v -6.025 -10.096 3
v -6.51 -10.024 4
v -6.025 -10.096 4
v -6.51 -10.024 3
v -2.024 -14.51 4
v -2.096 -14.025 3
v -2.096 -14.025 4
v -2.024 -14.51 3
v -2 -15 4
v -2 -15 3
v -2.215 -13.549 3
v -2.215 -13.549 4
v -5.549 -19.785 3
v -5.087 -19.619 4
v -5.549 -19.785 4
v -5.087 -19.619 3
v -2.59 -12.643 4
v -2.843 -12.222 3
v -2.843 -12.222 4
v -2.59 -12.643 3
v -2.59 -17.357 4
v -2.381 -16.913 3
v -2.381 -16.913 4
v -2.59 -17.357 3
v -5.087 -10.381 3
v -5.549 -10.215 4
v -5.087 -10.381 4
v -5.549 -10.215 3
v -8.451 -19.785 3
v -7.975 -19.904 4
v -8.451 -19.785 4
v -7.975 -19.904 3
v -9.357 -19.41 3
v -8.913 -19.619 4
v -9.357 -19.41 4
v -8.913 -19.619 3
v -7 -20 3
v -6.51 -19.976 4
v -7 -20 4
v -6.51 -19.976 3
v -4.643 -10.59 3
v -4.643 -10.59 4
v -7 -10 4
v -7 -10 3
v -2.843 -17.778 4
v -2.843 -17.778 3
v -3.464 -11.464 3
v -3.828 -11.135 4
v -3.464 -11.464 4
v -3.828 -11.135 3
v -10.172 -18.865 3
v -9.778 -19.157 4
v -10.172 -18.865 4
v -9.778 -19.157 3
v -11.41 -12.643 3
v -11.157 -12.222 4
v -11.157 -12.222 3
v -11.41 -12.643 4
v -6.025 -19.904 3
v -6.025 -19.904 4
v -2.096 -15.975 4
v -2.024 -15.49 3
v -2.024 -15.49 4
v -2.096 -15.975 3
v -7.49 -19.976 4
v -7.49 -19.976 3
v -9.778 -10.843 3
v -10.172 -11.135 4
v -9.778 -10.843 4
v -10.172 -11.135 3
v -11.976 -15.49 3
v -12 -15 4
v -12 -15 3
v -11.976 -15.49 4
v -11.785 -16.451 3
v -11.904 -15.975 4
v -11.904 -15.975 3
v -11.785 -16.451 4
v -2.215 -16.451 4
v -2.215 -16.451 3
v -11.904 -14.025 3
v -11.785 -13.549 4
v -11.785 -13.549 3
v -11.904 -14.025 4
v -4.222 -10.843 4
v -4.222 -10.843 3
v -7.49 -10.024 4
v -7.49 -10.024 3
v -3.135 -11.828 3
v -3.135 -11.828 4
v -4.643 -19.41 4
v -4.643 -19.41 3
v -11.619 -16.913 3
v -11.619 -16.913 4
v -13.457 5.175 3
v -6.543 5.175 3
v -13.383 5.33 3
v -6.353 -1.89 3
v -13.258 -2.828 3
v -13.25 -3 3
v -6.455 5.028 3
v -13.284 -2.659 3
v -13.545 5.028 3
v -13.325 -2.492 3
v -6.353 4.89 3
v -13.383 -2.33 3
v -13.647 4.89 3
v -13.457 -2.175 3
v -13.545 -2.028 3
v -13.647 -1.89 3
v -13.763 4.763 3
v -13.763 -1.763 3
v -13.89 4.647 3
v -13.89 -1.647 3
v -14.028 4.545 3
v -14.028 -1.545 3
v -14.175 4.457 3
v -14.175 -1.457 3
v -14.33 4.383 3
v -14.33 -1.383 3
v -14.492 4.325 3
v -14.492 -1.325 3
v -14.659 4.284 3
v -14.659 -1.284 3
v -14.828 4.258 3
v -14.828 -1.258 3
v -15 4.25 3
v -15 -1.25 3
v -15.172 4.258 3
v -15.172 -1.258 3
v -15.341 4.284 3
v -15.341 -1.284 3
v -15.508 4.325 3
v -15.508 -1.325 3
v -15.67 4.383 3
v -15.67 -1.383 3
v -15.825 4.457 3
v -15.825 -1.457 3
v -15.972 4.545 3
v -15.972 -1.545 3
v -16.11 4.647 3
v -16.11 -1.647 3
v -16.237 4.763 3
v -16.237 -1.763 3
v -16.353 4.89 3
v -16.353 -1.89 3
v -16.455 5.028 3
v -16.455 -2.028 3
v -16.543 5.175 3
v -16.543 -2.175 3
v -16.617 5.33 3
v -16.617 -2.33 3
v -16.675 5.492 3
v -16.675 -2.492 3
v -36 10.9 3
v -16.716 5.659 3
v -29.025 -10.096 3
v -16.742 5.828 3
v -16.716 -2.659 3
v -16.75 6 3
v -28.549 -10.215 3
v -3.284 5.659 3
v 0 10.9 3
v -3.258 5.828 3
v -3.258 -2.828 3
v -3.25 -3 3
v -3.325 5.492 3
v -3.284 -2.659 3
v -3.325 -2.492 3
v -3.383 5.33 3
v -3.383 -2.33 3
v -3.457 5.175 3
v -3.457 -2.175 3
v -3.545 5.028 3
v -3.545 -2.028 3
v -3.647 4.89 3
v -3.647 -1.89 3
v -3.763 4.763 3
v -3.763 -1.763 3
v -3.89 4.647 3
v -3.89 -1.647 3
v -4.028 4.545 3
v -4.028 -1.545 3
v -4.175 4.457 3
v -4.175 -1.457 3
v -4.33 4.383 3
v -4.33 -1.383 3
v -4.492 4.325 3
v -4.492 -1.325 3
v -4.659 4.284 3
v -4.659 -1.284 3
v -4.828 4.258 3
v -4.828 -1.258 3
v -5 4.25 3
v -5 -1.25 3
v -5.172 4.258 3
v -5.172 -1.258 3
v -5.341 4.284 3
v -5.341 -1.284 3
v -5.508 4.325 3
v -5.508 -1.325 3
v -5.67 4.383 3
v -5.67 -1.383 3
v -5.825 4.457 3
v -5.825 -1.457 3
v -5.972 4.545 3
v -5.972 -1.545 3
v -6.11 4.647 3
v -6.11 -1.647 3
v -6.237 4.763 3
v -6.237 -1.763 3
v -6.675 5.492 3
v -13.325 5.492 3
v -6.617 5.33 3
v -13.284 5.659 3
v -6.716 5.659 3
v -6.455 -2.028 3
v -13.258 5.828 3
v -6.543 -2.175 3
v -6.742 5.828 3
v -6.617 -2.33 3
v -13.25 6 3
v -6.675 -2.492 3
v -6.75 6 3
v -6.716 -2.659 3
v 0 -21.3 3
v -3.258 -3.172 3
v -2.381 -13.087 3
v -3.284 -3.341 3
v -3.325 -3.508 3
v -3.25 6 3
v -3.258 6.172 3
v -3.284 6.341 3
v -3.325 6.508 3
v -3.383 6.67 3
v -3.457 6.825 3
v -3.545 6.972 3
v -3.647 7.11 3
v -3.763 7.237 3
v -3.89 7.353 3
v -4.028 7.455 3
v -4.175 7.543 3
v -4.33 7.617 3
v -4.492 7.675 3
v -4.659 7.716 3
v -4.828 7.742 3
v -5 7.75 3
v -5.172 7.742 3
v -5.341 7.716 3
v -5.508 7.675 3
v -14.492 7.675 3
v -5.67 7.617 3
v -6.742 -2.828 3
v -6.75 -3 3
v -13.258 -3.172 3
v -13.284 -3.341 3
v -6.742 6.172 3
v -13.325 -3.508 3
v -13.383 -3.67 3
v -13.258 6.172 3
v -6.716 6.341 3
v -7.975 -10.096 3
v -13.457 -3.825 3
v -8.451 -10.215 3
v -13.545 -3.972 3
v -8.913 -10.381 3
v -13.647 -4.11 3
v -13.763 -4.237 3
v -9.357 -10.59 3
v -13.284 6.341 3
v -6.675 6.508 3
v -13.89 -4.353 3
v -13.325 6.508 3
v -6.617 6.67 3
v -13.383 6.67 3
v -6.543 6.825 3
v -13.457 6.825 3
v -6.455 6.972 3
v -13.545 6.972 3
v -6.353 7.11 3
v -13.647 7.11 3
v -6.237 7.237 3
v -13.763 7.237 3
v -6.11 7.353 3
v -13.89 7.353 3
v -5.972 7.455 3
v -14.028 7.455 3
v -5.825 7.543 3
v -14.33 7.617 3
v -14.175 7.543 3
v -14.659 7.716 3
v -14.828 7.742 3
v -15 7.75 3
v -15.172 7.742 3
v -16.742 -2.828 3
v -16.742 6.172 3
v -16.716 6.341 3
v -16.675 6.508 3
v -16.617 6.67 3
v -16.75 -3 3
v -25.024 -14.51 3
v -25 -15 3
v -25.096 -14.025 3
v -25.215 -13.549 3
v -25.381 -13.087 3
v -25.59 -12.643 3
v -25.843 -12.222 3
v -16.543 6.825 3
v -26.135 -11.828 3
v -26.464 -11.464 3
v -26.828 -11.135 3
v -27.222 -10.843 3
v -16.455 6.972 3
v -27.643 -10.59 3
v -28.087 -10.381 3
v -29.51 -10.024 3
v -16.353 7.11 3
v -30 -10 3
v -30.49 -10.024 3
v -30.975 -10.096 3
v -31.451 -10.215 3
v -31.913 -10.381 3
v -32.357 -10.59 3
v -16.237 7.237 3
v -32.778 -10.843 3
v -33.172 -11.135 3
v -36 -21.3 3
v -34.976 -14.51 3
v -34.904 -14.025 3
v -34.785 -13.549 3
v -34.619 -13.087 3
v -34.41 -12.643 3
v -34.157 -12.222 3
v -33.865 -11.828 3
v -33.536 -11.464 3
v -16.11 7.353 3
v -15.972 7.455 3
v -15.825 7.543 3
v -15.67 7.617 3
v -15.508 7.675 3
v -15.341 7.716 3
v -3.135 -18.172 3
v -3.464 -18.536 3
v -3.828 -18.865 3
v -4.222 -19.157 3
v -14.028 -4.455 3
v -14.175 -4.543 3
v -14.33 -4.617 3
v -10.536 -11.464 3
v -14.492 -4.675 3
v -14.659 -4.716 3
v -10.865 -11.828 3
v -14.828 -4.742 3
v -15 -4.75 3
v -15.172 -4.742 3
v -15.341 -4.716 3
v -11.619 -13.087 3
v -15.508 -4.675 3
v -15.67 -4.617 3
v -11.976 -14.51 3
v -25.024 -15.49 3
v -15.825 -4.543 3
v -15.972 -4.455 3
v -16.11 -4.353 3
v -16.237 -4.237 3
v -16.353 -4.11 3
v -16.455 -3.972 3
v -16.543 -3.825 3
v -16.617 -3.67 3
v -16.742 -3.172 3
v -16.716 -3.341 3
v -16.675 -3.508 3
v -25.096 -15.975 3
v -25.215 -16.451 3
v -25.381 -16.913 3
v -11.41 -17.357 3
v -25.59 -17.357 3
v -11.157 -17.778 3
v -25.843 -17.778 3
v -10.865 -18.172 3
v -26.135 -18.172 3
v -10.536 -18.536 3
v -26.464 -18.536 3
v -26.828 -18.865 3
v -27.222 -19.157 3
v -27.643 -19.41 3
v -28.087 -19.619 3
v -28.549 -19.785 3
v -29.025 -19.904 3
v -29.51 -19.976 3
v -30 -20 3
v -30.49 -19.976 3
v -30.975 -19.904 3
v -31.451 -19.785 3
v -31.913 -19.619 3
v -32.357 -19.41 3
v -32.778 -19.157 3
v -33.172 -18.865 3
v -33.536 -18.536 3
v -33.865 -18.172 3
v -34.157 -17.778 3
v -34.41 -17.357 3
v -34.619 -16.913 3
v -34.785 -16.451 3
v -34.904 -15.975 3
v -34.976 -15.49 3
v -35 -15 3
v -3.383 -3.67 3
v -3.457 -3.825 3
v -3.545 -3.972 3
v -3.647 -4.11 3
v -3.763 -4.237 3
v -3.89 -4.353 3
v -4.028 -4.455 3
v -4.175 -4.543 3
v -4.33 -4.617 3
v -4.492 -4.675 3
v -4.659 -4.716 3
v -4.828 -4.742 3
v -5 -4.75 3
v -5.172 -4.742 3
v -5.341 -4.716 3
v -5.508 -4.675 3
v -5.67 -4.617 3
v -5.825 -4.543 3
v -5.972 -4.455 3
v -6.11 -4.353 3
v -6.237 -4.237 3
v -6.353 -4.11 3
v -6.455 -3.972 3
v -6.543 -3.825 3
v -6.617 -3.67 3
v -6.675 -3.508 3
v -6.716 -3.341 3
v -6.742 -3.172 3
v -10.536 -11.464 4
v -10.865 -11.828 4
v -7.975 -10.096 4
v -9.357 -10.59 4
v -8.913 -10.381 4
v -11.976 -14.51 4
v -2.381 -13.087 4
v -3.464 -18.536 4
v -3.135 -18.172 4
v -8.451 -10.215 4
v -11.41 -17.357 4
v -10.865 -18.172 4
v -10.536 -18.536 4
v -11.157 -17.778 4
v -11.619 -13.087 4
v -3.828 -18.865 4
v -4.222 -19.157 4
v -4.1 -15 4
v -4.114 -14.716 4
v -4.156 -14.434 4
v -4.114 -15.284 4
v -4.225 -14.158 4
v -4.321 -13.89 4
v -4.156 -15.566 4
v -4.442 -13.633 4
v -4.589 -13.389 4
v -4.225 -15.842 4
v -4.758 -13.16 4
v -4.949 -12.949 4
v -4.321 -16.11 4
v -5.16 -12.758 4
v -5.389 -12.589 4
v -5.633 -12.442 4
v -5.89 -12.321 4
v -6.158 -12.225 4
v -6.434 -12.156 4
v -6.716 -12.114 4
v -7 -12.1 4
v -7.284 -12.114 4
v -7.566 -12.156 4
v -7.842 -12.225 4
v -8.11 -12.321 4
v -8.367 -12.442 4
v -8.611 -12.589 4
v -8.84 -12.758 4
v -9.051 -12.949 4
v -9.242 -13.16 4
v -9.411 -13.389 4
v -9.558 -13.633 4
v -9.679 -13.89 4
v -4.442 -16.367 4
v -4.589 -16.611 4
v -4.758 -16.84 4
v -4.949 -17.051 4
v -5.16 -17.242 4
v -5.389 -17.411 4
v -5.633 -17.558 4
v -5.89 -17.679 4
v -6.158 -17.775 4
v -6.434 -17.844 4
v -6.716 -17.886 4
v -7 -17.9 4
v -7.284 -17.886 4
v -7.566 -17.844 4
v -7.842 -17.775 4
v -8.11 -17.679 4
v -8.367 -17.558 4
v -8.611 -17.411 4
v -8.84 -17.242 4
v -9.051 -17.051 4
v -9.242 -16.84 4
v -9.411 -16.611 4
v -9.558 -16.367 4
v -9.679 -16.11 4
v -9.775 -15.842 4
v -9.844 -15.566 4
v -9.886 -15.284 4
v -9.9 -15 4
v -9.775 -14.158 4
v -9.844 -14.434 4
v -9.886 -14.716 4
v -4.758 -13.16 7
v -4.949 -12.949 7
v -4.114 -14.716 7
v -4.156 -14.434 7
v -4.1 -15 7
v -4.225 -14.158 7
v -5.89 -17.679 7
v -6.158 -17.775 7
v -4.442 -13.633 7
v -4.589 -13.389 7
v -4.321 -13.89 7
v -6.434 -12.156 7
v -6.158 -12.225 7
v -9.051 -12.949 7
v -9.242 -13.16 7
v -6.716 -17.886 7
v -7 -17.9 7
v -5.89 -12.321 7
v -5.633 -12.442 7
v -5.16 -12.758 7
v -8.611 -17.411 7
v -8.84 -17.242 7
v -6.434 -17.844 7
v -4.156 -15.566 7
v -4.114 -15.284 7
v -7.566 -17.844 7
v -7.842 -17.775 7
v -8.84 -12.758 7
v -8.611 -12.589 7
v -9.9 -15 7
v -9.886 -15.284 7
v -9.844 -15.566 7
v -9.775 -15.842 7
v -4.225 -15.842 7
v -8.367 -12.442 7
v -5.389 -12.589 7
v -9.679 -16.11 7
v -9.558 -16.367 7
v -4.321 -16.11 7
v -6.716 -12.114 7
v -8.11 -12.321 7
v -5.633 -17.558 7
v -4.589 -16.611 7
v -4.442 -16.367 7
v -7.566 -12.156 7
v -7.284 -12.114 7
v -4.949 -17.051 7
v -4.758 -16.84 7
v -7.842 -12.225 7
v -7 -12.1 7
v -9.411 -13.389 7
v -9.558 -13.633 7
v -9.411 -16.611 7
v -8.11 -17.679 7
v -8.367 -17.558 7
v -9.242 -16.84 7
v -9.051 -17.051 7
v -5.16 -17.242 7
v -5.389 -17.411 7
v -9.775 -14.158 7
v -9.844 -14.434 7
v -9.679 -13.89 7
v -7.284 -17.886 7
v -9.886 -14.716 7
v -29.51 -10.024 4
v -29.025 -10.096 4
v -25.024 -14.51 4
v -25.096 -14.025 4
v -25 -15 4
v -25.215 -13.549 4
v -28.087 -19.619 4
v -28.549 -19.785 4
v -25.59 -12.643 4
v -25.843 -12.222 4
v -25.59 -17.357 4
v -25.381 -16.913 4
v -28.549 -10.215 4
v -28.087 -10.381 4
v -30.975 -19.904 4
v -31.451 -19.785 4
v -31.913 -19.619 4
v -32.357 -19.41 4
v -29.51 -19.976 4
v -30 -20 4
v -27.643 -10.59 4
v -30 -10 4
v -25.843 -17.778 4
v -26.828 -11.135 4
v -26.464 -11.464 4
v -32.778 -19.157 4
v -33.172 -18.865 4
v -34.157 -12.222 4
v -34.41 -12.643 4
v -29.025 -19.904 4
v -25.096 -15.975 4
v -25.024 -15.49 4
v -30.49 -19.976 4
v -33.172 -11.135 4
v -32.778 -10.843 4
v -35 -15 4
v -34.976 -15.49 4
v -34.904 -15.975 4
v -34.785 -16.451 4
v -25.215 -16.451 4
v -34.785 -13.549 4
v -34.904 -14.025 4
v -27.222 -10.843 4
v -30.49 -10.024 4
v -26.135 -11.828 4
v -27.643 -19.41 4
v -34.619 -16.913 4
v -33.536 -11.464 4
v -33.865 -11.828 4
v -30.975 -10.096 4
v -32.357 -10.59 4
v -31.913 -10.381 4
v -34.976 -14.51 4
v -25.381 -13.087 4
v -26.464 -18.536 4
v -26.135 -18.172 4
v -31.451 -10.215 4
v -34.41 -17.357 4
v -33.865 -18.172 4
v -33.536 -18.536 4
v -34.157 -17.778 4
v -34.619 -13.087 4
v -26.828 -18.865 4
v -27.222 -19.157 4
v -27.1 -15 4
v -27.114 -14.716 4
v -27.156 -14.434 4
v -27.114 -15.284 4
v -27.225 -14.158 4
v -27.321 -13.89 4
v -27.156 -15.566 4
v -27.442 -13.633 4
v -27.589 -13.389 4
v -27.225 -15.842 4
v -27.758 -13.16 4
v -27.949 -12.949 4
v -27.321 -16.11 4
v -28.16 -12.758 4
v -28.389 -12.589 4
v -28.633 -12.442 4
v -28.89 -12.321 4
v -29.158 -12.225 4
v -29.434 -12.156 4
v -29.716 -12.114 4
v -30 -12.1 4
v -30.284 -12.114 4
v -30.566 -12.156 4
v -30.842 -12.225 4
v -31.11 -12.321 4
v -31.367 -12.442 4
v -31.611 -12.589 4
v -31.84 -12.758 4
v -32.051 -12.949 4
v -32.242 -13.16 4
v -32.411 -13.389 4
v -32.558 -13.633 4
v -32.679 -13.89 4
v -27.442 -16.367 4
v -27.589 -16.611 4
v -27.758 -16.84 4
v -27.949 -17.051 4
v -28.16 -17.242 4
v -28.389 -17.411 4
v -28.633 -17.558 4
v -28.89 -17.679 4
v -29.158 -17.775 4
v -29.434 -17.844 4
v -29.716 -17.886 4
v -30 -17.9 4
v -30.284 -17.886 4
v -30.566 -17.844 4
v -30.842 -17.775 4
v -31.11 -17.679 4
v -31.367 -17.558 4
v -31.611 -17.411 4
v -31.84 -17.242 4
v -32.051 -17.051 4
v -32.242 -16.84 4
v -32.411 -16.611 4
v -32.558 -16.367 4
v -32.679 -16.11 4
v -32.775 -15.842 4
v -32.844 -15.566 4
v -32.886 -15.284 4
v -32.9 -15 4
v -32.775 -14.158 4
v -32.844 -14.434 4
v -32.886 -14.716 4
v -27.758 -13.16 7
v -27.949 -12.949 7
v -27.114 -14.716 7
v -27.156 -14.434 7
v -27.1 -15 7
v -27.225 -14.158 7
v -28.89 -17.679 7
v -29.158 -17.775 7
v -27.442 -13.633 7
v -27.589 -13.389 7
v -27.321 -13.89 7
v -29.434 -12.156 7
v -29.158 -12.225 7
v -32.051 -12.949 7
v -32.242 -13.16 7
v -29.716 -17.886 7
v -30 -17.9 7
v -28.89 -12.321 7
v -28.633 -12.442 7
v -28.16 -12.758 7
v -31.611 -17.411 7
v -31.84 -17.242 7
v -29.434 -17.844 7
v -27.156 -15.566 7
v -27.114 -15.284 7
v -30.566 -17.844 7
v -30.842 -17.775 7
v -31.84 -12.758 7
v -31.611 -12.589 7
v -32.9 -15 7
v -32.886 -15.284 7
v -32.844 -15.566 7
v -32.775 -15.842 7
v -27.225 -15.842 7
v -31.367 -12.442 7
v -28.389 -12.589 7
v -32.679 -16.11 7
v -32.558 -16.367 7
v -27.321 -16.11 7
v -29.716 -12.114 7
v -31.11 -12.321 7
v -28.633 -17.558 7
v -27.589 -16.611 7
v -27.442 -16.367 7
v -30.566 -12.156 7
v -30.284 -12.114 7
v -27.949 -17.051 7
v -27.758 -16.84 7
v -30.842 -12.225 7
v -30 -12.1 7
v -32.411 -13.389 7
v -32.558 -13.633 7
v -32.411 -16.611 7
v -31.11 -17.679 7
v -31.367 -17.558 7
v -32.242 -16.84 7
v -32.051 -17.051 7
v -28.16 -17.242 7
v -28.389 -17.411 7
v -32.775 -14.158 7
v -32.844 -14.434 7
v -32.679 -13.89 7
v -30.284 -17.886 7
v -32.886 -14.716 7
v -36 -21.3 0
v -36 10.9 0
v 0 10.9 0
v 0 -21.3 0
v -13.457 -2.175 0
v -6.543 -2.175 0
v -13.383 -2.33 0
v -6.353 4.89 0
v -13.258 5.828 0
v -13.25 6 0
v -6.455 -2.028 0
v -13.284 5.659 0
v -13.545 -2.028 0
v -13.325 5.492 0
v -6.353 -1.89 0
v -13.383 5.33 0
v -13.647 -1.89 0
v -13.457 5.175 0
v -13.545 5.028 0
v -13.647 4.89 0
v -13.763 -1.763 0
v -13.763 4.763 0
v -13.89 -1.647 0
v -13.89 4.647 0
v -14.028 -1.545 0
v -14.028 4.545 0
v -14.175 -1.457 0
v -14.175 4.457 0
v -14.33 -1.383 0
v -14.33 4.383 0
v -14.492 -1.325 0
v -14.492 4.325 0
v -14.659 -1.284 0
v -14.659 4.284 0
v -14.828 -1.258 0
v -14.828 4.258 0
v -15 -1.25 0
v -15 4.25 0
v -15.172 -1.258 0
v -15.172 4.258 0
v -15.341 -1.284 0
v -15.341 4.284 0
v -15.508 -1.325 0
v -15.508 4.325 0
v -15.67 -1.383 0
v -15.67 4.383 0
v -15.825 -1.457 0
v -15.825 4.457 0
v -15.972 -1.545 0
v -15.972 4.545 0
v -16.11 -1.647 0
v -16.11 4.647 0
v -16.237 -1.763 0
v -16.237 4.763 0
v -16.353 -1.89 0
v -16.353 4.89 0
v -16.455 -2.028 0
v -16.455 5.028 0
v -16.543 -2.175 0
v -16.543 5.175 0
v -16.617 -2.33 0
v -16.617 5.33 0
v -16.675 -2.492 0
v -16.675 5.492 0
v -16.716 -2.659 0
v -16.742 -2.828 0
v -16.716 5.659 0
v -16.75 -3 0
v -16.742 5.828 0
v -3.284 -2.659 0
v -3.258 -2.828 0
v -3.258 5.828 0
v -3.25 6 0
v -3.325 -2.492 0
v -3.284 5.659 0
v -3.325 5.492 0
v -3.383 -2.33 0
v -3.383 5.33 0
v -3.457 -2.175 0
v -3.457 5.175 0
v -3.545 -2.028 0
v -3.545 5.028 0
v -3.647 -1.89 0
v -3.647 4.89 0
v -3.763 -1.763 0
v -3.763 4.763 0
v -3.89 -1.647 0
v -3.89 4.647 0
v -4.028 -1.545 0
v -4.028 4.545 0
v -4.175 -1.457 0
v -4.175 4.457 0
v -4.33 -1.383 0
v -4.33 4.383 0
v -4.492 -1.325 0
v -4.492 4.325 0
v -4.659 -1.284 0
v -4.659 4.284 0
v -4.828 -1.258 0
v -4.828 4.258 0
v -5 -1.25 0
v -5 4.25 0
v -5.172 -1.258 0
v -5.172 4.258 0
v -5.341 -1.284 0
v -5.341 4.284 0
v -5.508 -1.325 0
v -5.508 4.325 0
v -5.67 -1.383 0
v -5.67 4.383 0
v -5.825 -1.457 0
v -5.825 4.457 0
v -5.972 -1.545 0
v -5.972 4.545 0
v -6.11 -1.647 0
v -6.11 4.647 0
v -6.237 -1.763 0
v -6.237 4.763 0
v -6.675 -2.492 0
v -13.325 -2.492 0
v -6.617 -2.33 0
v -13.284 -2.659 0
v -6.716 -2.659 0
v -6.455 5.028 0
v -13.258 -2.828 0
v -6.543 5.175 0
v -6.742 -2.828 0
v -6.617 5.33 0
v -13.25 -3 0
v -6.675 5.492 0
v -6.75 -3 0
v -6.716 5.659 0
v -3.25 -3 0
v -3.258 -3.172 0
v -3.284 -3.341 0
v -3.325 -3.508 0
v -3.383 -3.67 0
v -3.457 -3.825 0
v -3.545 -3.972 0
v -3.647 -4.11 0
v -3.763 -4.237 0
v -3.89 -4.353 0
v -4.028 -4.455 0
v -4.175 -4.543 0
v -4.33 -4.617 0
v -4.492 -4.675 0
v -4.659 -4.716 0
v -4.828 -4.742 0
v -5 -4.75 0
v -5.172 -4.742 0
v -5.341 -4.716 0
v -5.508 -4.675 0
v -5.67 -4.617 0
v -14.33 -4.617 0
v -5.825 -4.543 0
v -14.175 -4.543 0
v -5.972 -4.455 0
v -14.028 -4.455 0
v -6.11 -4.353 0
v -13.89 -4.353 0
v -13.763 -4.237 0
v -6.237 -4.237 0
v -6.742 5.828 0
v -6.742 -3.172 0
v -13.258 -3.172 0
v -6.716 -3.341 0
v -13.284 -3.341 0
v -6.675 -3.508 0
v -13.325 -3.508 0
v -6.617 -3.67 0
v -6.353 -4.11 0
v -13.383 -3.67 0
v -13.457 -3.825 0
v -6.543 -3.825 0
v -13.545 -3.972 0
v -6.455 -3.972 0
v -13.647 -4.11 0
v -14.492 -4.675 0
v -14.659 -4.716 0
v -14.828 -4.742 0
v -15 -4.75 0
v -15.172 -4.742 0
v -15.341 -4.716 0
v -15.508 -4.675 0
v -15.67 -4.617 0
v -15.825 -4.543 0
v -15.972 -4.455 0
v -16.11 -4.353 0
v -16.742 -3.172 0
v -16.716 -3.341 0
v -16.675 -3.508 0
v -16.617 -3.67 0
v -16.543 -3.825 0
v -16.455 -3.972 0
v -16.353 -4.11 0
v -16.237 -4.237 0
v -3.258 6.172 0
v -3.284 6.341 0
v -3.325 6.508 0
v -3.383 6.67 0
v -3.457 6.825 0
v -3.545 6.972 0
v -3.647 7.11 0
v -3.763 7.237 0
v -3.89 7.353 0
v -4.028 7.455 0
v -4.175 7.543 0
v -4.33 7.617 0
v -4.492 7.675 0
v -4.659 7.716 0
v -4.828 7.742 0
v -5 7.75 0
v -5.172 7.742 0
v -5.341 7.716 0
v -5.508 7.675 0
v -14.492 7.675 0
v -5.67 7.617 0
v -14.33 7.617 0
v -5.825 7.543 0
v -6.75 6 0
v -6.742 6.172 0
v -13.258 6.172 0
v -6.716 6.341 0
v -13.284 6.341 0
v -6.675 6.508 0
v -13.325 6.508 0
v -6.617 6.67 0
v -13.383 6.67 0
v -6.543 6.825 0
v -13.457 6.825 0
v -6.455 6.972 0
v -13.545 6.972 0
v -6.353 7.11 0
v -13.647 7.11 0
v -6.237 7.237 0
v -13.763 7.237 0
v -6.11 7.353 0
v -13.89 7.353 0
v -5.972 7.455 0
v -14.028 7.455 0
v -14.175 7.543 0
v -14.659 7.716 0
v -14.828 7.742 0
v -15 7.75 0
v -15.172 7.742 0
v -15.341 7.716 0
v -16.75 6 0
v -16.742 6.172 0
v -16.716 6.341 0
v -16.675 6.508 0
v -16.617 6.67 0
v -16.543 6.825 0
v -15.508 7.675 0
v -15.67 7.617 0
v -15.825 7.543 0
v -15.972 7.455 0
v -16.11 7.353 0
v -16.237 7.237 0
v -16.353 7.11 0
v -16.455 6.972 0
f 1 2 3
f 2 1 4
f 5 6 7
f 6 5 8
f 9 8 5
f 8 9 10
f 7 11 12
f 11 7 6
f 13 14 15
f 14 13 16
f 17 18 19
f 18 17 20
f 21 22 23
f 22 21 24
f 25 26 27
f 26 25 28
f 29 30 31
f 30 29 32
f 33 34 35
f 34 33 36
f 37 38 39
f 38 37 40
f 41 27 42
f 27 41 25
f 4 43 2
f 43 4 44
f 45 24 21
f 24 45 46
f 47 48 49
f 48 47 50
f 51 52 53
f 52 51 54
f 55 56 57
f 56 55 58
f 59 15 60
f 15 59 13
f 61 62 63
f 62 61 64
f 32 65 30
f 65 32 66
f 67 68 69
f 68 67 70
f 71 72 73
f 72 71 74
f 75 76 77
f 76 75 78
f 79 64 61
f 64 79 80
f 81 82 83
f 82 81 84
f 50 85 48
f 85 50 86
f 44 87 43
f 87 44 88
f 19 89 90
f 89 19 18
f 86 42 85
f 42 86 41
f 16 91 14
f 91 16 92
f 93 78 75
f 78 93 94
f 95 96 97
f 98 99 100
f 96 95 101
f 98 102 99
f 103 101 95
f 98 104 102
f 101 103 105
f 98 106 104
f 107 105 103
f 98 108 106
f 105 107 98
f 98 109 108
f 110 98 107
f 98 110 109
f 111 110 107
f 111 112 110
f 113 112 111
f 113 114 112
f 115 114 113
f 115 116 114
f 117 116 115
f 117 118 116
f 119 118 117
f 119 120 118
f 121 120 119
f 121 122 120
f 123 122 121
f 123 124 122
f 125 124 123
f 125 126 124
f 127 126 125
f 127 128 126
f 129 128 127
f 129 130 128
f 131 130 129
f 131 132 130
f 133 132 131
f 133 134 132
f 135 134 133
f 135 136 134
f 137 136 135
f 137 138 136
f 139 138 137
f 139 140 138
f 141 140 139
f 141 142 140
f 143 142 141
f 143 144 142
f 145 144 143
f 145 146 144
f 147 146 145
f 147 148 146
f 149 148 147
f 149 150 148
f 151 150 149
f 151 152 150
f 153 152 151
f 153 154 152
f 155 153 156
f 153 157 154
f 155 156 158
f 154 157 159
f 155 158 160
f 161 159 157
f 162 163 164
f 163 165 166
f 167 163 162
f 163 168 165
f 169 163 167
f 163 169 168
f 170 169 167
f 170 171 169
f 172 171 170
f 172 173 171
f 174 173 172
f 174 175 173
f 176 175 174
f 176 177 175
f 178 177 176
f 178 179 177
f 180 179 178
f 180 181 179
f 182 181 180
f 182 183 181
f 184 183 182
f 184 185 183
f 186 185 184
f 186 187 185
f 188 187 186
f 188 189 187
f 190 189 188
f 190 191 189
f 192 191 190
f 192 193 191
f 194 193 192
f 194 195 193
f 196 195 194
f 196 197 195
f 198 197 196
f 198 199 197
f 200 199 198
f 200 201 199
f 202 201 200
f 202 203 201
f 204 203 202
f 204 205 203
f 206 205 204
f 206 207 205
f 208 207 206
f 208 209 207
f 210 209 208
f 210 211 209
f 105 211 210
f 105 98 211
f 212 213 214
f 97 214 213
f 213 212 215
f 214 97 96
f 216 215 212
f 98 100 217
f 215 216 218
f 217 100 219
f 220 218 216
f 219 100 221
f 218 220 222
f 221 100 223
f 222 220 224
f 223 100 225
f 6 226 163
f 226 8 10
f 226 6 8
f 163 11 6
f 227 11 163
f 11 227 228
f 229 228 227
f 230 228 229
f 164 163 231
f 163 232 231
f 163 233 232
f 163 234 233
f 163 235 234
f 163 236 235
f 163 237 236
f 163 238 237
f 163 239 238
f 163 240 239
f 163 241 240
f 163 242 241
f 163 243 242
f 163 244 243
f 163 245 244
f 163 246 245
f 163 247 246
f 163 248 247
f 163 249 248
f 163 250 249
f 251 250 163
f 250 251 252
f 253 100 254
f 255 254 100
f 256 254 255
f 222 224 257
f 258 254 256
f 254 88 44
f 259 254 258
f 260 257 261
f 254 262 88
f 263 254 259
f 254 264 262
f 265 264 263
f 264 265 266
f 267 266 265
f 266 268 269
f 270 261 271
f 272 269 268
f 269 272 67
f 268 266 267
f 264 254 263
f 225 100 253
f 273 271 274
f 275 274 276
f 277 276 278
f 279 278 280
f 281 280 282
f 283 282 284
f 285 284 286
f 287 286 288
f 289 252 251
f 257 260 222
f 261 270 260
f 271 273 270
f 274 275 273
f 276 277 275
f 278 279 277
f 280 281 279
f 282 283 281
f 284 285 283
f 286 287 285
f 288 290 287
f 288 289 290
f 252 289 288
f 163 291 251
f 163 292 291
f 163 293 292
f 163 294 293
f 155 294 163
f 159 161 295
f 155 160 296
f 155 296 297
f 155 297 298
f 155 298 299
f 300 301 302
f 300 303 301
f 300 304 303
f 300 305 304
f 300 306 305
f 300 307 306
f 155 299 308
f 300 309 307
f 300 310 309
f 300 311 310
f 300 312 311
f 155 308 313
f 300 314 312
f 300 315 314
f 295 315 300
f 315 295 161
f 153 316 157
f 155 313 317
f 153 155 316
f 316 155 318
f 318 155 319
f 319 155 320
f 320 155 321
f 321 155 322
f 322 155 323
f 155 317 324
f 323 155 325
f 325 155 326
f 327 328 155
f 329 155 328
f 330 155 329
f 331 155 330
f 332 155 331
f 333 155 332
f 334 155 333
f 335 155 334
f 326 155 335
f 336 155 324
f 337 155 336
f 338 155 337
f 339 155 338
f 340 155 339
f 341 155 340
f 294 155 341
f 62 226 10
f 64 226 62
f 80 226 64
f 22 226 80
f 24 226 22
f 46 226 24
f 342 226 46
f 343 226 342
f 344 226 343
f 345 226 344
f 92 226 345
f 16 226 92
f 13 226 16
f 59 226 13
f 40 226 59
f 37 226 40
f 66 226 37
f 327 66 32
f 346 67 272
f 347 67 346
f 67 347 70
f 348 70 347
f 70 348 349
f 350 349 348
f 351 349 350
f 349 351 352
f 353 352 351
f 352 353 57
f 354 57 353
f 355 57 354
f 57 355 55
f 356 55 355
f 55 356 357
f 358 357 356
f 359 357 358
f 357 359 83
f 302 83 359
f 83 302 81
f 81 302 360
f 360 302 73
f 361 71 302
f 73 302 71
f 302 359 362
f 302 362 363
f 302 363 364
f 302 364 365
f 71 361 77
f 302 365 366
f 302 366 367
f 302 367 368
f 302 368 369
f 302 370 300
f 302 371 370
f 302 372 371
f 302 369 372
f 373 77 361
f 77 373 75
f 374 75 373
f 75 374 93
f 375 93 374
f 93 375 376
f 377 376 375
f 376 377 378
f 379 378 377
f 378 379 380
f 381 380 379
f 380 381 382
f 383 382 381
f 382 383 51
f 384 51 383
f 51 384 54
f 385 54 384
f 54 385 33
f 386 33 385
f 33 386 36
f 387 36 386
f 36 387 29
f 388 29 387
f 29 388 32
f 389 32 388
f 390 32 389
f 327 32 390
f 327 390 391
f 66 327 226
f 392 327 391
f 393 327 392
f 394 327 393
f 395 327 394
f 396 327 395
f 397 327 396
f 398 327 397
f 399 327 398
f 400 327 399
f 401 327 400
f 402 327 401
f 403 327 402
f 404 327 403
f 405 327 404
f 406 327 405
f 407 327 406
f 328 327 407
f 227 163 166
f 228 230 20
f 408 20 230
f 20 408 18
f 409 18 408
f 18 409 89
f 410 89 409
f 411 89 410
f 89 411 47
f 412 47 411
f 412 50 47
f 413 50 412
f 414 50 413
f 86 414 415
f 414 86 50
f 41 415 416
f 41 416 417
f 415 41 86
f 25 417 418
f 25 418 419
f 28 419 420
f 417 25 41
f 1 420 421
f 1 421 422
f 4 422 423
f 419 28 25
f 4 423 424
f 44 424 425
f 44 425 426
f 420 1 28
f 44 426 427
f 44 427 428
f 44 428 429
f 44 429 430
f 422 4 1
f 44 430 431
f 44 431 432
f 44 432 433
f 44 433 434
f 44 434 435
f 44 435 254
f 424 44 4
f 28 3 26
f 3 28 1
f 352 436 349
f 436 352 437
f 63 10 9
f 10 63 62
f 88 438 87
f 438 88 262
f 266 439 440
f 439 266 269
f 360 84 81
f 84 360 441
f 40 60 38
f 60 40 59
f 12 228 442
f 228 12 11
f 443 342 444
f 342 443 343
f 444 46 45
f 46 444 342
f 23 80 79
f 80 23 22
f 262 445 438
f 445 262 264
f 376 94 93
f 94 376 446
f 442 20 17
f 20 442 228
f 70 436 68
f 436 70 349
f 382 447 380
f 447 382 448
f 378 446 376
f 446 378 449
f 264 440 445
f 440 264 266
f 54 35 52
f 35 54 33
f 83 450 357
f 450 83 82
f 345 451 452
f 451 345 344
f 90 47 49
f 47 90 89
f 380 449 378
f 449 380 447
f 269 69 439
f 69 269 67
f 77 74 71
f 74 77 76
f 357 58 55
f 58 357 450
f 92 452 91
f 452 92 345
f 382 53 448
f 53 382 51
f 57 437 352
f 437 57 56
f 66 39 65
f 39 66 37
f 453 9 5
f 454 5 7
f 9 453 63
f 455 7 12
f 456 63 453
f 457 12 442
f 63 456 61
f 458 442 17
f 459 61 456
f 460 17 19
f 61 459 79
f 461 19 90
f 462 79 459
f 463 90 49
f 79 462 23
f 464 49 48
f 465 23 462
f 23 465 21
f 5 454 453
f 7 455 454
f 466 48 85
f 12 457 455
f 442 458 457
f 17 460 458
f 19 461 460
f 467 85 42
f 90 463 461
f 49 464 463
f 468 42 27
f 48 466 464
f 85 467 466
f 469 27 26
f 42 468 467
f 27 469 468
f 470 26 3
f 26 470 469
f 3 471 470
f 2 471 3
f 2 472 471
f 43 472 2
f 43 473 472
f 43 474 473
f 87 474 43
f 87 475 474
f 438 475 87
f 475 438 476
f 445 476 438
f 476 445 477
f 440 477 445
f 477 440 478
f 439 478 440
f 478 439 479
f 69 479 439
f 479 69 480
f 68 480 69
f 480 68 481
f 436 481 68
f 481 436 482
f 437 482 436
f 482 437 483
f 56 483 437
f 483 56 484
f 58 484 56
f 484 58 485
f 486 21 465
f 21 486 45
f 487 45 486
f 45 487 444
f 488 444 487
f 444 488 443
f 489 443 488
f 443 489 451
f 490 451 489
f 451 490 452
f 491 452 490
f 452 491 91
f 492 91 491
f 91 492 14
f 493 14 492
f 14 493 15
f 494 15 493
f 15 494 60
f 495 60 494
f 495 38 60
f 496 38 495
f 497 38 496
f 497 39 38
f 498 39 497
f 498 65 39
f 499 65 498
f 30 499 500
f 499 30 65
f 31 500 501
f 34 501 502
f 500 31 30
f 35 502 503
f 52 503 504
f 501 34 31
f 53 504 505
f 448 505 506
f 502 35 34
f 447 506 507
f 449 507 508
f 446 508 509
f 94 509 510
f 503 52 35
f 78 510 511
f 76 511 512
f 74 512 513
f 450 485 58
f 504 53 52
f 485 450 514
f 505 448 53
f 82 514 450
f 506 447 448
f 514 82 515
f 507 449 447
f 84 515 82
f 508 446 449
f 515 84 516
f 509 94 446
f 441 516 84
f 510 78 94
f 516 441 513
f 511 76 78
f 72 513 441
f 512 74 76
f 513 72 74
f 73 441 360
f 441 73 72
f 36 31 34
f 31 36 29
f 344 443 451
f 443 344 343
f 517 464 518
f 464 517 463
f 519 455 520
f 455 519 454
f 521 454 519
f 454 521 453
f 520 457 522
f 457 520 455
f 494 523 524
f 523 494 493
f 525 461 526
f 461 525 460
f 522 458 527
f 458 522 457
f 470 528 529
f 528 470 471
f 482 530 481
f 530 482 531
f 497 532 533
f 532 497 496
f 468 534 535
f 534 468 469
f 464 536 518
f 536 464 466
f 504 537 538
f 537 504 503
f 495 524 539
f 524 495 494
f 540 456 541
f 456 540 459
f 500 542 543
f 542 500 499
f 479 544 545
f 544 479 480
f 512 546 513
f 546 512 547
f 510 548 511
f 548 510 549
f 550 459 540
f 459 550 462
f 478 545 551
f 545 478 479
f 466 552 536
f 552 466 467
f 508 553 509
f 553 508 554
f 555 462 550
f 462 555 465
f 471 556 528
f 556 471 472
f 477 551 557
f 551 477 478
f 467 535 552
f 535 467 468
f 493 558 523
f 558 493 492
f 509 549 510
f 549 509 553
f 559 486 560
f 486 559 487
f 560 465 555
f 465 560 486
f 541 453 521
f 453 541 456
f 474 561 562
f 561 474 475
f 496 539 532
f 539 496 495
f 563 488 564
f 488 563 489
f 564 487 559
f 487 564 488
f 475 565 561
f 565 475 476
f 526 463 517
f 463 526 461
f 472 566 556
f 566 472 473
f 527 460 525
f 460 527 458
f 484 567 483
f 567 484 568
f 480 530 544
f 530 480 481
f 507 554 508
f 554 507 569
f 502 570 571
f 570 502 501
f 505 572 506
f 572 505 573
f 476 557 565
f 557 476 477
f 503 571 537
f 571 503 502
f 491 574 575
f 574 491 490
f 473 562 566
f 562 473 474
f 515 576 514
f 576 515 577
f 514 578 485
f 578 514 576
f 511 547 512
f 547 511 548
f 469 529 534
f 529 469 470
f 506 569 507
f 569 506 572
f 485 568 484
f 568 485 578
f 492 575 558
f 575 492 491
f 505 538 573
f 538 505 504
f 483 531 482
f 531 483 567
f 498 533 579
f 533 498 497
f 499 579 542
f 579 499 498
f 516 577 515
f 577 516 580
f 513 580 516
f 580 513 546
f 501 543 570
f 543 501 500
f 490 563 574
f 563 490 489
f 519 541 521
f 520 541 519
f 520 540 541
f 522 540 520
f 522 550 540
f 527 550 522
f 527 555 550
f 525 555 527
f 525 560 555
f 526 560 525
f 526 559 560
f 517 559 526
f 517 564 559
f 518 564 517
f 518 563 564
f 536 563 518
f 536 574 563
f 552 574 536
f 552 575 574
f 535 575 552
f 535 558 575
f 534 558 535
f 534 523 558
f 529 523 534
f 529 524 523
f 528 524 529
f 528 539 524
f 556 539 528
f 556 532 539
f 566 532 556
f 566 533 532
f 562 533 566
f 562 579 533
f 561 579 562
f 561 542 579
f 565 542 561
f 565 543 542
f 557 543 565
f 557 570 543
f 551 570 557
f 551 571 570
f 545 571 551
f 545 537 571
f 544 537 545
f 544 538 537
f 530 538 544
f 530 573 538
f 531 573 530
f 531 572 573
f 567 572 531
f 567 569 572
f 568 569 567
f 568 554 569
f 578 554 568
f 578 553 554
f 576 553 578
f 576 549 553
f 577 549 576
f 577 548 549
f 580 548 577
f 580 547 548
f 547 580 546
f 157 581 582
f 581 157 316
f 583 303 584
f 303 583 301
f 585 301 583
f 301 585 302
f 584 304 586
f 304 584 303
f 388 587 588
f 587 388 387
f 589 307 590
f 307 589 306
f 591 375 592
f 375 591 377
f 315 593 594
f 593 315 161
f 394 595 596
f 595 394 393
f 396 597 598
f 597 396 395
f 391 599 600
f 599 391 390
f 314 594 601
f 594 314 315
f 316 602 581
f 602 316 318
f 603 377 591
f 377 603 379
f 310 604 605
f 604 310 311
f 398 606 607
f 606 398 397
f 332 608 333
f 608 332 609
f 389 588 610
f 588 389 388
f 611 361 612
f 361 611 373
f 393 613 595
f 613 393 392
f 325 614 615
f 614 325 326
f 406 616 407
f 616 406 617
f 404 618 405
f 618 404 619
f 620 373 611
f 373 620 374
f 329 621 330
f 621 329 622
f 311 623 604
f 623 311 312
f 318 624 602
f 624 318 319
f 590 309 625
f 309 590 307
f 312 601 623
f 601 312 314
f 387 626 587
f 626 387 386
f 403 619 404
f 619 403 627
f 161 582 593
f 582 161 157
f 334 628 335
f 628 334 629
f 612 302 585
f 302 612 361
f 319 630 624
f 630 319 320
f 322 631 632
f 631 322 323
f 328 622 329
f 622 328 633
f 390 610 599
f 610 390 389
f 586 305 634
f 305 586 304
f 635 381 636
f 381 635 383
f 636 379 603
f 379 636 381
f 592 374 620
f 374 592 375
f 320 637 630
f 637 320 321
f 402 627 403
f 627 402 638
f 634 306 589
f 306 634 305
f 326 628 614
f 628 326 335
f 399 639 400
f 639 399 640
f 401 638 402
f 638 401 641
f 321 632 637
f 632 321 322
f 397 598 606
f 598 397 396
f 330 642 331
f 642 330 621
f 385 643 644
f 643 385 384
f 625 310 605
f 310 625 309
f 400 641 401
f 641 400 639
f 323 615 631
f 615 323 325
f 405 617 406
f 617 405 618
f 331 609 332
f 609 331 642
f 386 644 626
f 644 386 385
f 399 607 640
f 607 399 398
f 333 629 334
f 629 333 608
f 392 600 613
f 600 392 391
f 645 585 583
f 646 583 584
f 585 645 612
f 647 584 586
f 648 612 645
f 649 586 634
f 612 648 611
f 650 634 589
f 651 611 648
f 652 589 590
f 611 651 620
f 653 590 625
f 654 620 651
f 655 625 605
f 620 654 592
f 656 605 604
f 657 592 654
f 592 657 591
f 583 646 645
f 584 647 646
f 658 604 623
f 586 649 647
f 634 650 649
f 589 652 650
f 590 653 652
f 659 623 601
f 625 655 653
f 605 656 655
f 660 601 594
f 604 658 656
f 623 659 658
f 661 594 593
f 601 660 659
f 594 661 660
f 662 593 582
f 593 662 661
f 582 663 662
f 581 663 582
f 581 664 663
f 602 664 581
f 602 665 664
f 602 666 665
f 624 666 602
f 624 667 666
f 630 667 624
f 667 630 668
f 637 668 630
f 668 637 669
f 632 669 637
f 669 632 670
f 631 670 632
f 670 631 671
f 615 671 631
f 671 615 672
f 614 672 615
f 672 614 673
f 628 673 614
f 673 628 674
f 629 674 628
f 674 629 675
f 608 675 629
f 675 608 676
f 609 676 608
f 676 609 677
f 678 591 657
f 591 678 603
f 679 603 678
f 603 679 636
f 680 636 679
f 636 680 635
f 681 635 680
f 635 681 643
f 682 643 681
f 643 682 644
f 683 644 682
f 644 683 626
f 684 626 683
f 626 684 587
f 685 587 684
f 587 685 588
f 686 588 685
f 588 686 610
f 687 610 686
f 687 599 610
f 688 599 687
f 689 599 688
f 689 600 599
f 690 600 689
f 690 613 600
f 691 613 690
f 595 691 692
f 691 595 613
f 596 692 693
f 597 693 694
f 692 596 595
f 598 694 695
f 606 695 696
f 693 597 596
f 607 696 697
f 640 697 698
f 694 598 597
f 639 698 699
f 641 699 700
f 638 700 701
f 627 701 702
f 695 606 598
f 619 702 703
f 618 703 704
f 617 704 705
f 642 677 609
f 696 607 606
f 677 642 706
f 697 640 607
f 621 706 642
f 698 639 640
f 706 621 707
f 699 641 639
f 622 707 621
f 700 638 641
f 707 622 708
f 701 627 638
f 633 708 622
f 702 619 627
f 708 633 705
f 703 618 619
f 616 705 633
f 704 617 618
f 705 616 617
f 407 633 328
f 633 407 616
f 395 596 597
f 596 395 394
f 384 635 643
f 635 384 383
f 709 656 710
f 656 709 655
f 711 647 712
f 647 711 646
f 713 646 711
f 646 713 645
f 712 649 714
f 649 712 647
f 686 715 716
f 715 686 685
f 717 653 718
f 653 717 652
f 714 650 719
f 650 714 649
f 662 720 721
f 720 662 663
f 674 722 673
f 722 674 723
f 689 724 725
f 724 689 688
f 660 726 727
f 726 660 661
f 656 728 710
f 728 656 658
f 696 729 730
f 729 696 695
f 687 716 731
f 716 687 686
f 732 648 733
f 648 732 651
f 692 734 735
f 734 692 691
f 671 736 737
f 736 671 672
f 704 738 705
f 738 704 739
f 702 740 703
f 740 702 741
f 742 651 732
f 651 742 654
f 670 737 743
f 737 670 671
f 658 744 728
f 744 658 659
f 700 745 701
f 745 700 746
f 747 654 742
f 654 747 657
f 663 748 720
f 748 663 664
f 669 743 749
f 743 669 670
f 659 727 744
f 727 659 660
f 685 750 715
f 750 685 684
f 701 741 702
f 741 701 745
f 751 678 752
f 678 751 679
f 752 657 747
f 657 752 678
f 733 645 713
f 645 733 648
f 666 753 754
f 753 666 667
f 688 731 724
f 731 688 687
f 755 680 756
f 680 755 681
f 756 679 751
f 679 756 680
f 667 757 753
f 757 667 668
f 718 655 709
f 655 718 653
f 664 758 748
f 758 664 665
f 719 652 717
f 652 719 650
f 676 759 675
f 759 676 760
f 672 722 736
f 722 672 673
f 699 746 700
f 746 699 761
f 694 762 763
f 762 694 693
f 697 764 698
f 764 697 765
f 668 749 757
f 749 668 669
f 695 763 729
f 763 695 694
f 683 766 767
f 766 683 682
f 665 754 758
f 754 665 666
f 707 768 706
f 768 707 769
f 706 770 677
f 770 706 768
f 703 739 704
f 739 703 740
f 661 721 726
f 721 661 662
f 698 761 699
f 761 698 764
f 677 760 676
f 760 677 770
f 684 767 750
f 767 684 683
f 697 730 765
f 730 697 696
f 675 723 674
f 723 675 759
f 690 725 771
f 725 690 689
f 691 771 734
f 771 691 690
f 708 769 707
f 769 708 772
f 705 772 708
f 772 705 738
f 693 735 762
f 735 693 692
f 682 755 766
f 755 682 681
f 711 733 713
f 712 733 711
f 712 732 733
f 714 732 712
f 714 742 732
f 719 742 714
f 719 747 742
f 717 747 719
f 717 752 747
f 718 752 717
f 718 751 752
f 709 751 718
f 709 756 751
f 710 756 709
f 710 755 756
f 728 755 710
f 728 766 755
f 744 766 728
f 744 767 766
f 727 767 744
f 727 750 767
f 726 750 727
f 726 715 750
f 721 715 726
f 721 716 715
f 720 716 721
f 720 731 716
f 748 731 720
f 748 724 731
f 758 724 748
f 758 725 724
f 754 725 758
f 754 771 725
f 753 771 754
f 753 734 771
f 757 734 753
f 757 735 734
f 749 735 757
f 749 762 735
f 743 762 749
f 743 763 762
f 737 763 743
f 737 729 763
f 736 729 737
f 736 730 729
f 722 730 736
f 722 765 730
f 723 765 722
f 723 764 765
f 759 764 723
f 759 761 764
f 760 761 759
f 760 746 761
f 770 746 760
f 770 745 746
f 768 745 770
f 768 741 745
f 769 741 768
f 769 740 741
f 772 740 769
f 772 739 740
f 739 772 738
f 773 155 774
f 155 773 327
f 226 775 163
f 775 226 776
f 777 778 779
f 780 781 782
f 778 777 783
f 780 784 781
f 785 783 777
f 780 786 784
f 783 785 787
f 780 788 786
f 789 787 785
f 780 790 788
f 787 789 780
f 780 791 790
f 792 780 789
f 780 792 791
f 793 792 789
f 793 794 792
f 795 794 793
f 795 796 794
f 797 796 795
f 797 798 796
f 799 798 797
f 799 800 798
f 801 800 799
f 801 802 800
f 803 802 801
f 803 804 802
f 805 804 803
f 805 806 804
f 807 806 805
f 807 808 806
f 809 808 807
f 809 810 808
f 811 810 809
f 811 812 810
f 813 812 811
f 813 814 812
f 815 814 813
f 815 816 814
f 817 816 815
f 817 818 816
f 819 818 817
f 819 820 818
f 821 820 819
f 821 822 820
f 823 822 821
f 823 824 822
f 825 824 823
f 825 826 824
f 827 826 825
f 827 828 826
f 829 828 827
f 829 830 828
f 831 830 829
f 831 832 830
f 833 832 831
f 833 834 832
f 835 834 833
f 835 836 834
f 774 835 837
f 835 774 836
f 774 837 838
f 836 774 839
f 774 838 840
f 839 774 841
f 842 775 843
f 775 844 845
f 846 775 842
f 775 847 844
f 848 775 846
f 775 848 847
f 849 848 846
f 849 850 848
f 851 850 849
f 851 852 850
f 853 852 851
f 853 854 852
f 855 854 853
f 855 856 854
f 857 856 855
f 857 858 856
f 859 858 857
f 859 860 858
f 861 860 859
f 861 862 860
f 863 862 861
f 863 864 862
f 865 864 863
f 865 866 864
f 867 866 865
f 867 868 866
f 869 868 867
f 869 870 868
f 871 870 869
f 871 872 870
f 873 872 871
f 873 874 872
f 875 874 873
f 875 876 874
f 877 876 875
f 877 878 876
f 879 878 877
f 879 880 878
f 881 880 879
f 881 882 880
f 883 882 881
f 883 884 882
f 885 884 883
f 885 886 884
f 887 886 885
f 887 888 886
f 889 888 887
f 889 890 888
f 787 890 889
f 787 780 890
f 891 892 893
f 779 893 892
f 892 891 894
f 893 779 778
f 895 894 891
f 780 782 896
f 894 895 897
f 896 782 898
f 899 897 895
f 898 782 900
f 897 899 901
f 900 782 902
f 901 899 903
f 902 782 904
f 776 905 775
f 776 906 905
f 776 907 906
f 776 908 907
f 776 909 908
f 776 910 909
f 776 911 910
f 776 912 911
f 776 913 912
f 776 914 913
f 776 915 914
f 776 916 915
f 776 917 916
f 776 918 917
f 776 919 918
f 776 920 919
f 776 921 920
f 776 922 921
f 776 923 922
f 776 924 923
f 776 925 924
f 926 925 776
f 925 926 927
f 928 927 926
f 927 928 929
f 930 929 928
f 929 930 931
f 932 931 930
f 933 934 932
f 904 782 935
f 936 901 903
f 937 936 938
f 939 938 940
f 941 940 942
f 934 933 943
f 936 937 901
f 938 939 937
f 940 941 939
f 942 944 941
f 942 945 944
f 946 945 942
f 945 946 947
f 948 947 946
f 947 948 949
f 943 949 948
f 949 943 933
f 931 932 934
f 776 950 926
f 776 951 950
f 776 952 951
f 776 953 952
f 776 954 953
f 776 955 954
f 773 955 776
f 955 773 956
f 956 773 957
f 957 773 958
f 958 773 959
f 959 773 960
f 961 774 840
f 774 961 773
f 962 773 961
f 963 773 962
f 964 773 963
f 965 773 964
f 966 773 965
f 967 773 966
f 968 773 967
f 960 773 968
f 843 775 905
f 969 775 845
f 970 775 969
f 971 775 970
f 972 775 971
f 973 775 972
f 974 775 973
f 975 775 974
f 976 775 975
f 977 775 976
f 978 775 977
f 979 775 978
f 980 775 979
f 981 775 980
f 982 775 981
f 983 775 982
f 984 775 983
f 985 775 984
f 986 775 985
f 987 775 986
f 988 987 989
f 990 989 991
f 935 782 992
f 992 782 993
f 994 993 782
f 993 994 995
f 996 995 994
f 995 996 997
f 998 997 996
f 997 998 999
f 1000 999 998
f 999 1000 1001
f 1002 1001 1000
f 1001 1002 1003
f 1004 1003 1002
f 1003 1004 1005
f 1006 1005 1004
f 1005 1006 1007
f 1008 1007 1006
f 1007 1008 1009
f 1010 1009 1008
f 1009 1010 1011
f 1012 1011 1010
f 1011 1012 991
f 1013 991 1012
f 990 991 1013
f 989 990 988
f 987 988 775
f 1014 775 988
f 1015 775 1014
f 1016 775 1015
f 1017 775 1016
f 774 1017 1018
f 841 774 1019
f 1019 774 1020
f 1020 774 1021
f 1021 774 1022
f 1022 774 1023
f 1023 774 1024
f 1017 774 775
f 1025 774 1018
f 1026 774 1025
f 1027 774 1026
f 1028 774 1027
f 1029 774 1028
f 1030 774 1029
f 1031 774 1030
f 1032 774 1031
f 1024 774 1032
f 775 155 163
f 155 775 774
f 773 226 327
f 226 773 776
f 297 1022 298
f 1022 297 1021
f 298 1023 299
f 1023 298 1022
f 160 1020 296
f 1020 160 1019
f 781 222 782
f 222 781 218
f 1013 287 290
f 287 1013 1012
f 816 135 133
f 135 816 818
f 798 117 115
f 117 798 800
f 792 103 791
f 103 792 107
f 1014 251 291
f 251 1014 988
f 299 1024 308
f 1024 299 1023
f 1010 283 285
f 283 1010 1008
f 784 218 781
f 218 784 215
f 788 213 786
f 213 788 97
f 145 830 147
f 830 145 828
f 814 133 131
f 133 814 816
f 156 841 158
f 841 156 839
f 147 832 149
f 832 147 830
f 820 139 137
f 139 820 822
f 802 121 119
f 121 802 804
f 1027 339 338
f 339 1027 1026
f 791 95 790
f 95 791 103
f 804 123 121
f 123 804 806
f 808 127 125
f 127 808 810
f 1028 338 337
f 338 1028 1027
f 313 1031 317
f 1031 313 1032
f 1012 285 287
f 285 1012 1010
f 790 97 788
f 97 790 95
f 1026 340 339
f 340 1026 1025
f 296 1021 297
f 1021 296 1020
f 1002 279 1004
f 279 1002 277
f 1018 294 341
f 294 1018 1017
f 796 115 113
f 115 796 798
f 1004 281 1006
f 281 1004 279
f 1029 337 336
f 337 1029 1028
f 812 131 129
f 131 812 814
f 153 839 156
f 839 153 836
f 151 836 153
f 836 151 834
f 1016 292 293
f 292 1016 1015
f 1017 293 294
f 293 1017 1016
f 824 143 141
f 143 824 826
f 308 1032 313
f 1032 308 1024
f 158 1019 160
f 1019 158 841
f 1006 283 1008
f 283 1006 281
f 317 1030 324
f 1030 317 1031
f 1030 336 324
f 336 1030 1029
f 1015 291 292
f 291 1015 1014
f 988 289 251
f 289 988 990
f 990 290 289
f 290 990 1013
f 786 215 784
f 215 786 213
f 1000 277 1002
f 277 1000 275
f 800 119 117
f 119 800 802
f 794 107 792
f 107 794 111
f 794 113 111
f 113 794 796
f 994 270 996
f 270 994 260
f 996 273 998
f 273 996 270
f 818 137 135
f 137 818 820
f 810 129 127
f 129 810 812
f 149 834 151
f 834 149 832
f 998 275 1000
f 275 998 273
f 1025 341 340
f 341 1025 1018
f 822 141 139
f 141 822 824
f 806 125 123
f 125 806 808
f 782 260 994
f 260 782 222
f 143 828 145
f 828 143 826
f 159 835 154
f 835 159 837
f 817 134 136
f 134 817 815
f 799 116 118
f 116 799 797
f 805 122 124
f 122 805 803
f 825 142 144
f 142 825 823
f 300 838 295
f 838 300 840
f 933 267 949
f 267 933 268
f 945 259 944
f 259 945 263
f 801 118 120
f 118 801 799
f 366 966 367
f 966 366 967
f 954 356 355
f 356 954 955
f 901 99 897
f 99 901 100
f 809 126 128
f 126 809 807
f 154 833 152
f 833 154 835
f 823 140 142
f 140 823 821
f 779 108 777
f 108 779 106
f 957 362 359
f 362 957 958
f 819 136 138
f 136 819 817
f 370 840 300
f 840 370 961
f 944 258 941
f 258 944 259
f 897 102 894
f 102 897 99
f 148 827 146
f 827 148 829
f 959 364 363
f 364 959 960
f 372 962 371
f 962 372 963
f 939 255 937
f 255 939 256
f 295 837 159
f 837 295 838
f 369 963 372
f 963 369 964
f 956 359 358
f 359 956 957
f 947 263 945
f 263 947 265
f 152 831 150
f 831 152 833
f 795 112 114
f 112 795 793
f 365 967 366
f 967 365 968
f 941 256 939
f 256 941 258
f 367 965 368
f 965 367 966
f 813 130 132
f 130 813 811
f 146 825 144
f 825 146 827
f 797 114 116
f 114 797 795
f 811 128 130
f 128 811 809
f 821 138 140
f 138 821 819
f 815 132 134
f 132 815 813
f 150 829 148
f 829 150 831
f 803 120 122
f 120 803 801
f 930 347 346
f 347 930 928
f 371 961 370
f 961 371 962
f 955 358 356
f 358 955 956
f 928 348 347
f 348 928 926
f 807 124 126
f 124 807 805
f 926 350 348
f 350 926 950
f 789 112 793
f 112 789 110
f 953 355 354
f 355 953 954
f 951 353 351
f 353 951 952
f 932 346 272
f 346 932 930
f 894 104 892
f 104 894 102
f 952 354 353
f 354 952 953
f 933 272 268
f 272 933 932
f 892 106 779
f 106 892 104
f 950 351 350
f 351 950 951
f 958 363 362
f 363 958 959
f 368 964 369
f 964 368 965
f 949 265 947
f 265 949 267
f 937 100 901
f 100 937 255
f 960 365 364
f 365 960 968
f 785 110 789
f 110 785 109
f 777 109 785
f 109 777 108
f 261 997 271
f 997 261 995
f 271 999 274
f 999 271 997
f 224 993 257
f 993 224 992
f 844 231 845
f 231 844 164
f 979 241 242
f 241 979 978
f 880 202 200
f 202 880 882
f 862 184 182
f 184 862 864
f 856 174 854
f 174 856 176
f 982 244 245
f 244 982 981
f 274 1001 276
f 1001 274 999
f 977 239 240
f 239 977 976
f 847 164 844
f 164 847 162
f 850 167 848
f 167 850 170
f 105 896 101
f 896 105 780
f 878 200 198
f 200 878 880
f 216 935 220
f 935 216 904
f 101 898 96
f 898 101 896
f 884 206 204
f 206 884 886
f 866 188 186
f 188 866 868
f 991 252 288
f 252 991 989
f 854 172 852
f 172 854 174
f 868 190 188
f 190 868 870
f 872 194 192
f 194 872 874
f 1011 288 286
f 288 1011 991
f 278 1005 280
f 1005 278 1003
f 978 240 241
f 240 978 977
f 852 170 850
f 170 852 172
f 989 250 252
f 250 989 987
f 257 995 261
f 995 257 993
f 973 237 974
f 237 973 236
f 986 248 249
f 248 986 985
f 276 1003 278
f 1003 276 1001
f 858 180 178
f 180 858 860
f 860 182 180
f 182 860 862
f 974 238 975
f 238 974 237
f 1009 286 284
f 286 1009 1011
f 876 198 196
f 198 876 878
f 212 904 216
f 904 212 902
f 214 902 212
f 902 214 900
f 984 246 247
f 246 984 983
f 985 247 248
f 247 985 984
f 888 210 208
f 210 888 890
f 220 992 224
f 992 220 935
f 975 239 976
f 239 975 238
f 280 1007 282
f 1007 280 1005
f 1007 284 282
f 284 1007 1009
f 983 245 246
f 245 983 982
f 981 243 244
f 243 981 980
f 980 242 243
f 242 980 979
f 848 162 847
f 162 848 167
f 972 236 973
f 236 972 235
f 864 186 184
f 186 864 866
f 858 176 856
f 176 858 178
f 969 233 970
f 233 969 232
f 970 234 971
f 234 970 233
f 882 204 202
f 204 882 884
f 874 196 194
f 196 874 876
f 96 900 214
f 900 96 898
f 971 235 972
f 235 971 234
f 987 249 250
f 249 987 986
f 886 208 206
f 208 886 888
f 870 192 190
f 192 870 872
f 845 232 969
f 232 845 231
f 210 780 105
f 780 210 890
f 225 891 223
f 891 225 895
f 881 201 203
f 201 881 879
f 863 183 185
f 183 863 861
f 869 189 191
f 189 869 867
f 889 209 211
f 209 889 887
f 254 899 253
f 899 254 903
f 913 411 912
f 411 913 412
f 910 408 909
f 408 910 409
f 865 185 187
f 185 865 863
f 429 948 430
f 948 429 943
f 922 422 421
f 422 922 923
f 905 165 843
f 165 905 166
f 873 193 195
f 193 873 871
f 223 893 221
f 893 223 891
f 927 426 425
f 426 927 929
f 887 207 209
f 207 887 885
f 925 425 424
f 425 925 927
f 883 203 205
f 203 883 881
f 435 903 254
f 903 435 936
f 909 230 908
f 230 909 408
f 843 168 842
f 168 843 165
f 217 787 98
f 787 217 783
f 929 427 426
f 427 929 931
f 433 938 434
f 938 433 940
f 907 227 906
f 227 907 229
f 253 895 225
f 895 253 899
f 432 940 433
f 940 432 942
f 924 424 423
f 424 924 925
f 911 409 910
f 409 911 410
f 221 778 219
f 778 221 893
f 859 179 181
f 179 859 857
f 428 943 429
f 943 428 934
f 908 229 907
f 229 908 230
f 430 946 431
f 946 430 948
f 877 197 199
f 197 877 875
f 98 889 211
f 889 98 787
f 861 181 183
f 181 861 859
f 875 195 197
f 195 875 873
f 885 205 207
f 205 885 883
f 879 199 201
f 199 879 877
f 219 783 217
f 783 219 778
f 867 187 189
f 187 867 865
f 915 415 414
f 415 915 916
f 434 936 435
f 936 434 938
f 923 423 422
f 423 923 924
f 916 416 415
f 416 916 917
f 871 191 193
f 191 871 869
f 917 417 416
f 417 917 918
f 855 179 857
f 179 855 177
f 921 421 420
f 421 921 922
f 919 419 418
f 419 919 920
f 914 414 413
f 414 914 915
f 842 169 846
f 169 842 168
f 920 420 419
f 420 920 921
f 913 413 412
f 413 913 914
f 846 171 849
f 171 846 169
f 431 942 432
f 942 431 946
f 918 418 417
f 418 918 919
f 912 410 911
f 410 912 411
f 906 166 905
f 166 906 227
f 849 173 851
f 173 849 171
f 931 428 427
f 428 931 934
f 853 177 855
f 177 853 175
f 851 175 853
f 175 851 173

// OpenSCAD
// file: subpieces/articulationAxisSubPiece.scad
/**
 * articulationAxisSubPiece
 * @name articulationAxisSubPiece
 * @description articlulation axis
 * @type subPiece
 */
module articulationAxisSubPiece(
    base_diameter,
    base_height,
    axis_diameter,
    axis_height,
    _fn = 64
) {
    cylinder(
        r = base_diameter / 2,
        h = base_height,
        $fn = _fn
    );
    translate(
        [
            0,
            0,
            base_height
        ]
    )
        cylinder(
            r = axis_diameter / 2,
            h = axis_height,
            $fn = _fn
        );

}

articulationAxisSubPiece();
// file: ../envelopes/screw-envelope.scad
screwEnvelope();

module screwEnvelope(
    center_screwed_position = false,
    diameter_ajustment_head = 0.2,
    diameter_ajustment_screw = -0.1,
    _fn = 128
) {

    head_height = 2.1;
    middle_height = 0.9;
    bottom_height = 6;

    z_centring_translation = center_screwed_position ? -head_height -middle_height : 0;

    translate([0,0, z_centring_translation])
        union() {
            cylinder(
                r = 7.95 / 2 + diameter_ajustment_head,
                h = head_height + middle_height,
                $fn = _fn);
            translate([0, 0, head_height + middle_height])
                cylinder(
                    r1 = 3.4 / 2 + diameter_ajustment_screw,
                    r2 = 3.1 / 2 + diameter_ajustment_screw,
                    h = bottom_height,
                    $fn = _fn
                );
        }
}
// file: ../envelopes/servo-envelope.scad
servoEnvelope();

// Enveloppe for servo holes fixations
// Around the servo motor and the fixation holes

module servoEnvelope(
    servo_hole_scale = 1,
    screw_hole_diameter = 2
) {

    servo_length = 22.2;
    servo_width = 11.8;
    servo_height = 22.7;

    // translating to center the servo motor envelope as servo
    scale(servo_hole_scale)
        translate([-servo_width / 2, - servo_length + (servo_width / 2), -servo_height/2])
            cube([servo_width, servo_length, servo_height], center = false);    

    
    translate([-servo_width / 2, - servo_length + (servo_width / 2), -servo_height/2]) {
        translate([servo_width / 2, - 2.3, 0])
            cylinder(h = servo_height, r = 1, center = false, $fn = 16);

        translate([servo_width / 2, servo_length + 2.3, 0])
            cylinder(h = servo_height, r = 1, center = false, $fn = 16);
    }
}
// main file
use <../envelopes/servo-envelope.scad>
use <../envelopes/screw-envelope.scad>
use <./subpieces/articulationAxisSubPiece.scad>


/**
 * HipPieceB
 * @name HipPieceB
 * @description Hip Piece B
 * @type piece
 * @parent HipComponent
 */
module hipPieceB(
    x_offset_top_axis = -15,
    x_offset_bottom_axis = -15
) {

    main_piece_height = 36;
    articluation_axis_diameter_offest = 0.2;

    display_optional_screw_holes = false;
    
    screw_hole_diameter = 3.5;

    _fn = 64;

    difference() {
        union() {
            translate(
                [
                    0,
                    -32.2 + 5 + (11.8 / 2),
                    0
                ])
                cube([3, 32.2, main_piece_height]);

            translate(
                [
                    3,
                    x_offset_bottom_axis,
                    7
                ])
                rotate([0, 90, 0])
                    articulationAxisSubPiece(
                        base_diameter = 10,
                        base_height = 1,
                        axis_diameter = 6 - articluation_axis_diameter_offest,
                        axis_height = 3
                    );

            translate(
                [
                    3,
                    x_offset_bottom_axis,
                    30
                ])
                rotate([0, 90, 0])
                    articulationAxisSubPiece(
                        base_diameter = 10,
                        base_height = 1,
                        axis_diameter = 6 - articluation_axis_diameter_offest,
                        axis_height = 3
                    );

        }

        // Hole for the screw of the bottom articulation axis
        if (display_optional_screw_holes)
            translate([4.01 + 3, x_offset_bottom_axis, 7])
                rotate([0, -90, 0])
                    screwEnvelope(center_screwed_position = true);
        
        // 4 Holes for the hip block fixations
        translate([1.5, 0, 0]) {
            translate([0, 6, 15])
                rotate([0, -90, 0])
                    cylinder(r = screw_hole_diameter / 2, h = 10, center = true, $fn = _fn);

            translate([0, -3, 15])
                rotate([0, -90, 0])
                    cylinder(r = screw_hole_diameter / 2, h = 10, center = true, $fn = _fn);

            translate([0, 6, 5])
                rotate([0, -90, 0])
                    cylinder(r = screw_hole_diameter / 2, h = 10, center = true, $fn = _fn);

            translate([0, -3, 5])
                rotate([0, -90, 0])
                    cylinder(r = screw_hole_diameter / 2, h = 10, center = true, $fn = _fn);
        }
    }
}


/**
 * @stl
 * @png
 * @colorscheme BeforeDawn
 * @view axes,scales
 */
rotate([0, -90, 0])
    hipPieceB();
